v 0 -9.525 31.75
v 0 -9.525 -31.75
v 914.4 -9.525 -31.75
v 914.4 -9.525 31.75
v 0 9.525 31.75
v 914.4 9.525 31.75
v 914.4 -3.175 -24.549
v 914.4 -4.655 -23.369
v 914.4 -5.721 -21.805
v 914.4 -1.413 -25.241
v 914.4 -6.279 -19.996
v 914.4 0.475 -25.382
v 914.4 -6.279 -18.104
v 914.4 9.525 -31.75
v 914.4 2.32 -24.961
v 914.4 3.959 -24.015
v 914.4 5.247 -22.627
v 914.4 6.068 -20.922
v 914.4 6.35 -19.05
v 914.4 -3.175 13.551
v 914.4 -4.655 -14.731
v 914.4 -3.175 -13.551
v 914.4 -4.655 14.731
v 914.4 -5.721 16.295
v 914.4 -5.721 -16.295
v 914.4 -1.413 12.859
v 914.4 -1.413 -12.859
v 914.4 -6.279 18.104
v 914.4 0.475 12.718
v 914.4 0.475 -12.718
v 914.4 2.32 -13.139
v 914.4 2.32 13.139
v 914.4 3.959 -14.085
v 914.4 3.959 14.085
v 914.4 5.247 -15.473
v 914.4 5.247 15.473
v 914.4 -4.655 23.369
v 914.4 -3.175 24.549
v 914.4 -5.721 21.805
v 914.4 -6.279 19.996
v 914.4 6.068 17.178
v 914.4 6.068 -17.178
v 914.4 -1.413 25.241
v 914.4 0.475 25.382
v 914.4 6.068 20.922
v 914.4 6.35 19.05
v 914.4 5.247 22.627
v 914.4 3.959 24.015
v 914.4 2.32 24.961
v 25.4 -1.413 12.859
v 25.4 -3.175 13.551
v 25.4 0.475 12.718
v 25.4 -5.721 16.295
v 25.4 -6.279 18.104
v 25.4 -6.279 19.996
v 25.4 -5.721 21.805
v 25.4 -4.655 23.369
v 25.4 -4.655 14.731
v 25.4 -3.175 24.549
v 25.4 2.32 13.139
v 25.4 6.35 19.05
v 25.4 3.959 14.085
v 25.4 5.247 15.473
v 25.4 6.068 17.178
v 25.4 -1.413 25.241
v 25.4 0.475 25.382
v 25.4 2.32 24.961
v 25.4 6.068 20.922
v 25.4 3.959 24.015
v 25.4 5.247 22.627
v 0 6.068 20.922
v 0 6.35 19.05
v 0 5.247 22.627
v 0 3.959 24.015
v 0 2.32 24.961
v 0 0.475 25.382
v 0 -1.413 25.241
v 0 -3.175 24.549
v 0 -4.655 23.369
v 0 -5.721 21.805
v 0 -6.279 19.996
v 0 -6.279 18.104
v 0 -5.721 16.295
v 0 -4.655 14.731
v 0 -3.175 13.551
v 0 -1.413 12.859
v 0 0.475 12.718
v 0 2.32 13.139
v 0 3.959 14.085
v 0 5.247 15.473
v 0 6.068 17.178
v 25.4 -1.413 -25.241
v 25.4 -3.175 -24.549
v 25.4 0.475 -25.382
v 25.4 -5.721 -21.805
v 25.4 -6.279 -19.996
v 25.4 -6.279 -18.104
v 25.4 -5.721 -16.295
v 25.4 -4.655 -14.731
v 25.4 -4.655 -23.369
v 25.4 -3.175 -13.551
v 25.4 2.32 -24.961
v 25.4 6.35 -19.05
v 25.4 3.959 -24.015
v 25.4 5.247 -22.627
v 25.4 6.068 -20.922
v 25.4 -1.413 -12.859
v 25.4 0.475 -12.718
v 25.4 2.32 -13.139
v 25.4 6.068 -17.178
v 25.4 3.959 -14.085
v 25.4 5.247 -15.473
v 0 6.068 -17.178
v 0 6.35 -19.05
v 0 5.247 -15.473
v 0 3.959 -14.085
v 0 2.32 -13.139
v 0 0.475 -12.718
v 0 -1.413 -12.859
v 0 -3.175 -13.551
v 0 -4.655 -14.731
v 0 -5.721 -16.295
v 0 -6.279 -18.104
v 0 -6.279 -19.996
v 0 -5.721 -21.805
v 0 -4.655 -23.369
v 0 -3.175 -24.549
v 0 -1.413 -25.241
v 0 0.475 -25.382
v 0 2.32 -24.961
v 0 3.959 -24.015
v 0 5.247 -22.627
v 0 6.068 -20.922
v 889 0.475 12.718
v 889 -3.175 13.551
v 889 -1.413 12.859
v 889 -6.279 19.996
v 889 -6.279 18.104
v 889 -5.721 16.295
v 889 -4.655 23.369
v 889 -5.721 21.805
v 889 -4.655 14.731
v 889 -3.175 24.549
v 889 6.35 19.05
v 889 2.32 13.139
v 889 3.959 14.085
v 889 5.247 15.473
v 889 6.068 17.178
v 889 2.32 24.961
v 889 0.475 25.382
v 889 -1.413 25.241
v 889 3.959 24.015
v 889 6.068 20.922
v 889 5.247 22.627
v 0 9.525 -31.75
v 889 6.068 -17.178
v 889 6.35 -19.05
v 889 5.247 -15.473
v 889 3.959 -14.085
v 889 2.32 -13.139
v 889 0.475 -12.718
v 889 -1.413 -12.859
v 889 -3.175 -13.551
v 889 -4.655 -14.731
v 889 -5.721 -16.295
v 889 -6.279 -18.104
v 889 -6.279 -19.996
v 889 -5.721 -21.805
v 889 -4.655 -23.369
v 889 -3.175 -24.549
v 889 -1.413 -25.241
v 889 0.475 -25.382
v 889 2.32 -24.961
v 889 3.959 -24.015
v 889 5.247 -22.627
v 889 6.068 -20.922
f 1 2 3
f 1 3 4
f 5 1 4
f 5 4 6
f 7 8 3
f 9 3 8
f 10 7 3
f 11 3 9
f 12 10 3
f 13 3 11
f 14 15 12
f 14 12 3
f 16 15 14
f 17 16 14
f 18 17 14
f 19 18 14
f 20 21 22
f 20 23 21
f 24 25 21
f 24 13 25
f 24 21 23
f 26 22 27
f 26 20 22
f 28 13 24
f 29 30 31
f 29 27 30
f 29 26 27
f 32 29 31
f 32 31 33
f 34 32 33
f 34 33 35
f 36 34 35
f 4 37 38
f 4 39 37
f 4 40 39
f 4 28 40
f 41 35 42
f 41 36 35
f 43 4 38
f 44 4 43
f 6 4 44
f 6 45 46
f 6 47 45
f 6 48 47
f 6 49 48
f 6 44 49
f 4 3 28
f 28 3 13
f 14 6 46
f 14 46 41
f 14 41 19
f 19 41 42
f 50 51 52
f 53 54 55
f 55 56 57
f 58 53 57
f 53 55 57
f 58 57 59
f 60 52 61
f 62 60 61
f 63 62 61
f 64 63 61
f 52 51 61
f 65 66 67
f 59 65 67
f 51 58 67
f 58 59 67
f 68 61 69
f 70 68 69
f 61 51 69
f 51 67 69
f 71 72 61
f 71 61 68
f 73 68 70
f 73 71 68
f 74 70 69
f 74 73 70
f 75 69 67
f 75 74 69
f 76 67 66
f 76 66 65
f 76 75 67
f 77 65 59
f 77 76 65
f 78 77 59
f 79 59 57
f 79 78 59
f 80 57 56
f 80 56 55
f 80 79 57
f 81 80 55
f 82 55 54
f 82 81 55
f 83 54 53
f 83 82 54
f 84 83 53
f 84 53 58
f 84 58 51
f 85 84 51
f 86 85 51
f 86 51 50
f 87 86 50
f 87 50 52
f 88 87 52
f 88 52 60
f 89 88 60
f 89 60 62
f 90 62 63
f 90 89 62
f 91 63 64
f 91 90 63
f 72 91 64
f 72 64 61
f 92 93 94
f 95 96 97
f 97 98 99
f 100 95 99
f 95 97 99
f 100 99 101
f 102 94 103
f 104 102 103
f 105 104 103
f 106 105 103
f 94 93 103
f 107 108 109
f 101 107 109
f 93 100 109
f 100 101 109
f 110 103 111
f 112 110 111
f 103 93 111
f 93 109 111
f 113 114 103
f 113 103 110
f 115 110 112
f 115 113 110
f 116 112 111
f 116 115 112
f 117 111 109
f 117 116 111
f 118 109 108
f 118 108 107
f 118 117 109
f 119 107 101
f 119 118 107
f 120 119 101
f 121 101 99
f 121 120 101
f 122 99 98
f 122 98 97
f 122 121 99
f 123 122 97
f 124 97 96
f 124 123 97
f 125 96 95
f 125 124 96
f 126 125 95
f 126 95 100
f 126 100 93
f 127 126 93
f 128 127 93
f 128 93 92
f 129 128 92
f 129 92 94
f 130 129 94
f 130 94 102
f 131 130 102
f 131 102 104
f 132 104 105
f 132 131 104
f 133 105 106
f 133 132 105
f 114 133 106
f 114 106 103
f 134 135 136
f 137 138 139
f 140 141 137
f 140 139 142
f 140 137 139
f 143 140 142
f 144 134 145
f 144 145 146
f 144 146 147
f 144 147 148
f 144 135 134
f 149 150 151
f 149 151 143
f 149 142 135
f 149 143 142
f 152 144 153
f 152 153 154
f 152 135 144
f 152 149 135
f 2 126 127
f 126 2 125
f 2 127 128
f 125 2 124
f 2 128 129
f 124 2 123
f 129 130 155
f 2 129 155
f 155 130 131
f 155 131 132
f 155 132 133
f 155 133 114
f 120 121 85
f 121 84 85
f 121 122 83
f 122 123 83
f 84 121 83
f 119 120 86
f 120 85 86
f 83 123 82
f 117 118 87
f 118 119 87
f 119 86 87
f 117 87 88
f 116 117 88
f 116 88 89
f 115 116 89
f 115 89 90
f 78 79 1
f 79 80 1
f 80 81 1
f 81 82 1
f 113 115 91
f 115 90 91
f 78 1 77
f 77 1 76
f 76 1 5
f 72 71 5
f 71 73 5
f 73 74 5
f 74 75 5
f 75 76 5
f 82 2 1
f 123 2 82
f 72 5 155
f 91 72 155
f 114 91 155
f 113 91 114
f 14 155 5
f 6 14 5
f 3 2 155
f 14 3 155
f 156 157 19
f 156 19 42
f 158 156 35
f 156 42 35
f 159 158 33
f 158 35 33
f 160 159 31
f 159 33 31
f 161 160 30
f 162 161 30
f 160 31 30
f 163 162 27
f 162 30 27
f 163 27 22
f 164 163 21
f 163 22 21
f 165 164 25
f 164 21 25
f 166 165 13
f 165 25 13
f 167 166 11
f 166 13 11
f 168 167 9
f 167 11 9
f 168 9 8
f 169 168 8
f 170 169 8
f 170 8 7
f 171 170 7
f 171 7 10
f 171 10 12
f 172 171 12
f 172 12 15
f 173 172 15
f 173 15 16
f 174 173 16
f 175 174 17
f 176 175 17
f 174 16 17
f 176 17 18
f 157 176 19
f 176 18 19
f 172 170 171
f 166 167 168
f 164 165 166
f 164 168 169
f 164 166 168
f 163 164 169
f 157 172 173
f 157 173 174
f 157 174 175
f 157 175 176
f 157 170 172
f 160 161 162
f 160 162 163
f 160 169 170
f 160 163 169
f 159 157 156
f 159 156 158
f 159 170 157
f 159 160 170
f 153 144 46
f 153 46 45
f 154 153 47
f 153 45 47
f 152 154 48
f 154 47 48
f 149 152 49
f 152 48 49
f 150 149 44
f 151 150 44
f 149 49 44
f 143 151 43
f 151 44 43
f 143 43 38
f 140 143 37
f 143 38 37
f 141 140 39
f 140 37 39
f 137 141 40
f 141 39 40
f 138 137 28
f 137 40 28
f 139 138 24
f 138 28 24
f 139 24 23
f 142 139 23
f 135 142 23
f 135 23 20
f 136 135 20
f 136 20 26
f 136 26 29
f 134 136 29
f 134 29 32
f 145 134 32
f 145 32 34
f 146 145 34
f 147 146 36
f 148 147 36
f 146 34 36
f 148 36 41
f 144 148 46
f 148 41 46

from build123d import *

# Parameters (mm, degrees)
F0_W     = 19.05
F0_H     = 63.5
F1_DEPTH = 914.4
F2_R     = 6.35
F3_DEPTH = 25.4
F4_R     = 6.35
F5_DEPTH = 25.4


with BuildPart() as f1:
    # F0 (on Right) → F1 (new body)
    with BuildSketch(Plane.YZ):
        Rectangle(F0_W, F0_H)
    extrude(amount=F1_DEPTH)

    # F2 (on Right) → F3 (cut)
    with BuildSketch(Plane.YZ):
        with Locations((0, 19.05)):
            Circle(F2_R)
        with Locations((0, -19.05)):
            Circle(F2_R)
    extrude(amount=F3_DEPTH, mode=Mode.SUBTRACT)

    # F4 (on face) → F5 (cut)
    with BuildSketch(Plane.YZ.offset(914.4)):
        with Locations((0, 19.05)):
            Circle(F4_R)
        with Locations((0, -19.05)):
            Circle(F4_R)
    extrude(amount=-F5_DEPTH, mode=Mode.SUBTRACT)


solid = f1.part
